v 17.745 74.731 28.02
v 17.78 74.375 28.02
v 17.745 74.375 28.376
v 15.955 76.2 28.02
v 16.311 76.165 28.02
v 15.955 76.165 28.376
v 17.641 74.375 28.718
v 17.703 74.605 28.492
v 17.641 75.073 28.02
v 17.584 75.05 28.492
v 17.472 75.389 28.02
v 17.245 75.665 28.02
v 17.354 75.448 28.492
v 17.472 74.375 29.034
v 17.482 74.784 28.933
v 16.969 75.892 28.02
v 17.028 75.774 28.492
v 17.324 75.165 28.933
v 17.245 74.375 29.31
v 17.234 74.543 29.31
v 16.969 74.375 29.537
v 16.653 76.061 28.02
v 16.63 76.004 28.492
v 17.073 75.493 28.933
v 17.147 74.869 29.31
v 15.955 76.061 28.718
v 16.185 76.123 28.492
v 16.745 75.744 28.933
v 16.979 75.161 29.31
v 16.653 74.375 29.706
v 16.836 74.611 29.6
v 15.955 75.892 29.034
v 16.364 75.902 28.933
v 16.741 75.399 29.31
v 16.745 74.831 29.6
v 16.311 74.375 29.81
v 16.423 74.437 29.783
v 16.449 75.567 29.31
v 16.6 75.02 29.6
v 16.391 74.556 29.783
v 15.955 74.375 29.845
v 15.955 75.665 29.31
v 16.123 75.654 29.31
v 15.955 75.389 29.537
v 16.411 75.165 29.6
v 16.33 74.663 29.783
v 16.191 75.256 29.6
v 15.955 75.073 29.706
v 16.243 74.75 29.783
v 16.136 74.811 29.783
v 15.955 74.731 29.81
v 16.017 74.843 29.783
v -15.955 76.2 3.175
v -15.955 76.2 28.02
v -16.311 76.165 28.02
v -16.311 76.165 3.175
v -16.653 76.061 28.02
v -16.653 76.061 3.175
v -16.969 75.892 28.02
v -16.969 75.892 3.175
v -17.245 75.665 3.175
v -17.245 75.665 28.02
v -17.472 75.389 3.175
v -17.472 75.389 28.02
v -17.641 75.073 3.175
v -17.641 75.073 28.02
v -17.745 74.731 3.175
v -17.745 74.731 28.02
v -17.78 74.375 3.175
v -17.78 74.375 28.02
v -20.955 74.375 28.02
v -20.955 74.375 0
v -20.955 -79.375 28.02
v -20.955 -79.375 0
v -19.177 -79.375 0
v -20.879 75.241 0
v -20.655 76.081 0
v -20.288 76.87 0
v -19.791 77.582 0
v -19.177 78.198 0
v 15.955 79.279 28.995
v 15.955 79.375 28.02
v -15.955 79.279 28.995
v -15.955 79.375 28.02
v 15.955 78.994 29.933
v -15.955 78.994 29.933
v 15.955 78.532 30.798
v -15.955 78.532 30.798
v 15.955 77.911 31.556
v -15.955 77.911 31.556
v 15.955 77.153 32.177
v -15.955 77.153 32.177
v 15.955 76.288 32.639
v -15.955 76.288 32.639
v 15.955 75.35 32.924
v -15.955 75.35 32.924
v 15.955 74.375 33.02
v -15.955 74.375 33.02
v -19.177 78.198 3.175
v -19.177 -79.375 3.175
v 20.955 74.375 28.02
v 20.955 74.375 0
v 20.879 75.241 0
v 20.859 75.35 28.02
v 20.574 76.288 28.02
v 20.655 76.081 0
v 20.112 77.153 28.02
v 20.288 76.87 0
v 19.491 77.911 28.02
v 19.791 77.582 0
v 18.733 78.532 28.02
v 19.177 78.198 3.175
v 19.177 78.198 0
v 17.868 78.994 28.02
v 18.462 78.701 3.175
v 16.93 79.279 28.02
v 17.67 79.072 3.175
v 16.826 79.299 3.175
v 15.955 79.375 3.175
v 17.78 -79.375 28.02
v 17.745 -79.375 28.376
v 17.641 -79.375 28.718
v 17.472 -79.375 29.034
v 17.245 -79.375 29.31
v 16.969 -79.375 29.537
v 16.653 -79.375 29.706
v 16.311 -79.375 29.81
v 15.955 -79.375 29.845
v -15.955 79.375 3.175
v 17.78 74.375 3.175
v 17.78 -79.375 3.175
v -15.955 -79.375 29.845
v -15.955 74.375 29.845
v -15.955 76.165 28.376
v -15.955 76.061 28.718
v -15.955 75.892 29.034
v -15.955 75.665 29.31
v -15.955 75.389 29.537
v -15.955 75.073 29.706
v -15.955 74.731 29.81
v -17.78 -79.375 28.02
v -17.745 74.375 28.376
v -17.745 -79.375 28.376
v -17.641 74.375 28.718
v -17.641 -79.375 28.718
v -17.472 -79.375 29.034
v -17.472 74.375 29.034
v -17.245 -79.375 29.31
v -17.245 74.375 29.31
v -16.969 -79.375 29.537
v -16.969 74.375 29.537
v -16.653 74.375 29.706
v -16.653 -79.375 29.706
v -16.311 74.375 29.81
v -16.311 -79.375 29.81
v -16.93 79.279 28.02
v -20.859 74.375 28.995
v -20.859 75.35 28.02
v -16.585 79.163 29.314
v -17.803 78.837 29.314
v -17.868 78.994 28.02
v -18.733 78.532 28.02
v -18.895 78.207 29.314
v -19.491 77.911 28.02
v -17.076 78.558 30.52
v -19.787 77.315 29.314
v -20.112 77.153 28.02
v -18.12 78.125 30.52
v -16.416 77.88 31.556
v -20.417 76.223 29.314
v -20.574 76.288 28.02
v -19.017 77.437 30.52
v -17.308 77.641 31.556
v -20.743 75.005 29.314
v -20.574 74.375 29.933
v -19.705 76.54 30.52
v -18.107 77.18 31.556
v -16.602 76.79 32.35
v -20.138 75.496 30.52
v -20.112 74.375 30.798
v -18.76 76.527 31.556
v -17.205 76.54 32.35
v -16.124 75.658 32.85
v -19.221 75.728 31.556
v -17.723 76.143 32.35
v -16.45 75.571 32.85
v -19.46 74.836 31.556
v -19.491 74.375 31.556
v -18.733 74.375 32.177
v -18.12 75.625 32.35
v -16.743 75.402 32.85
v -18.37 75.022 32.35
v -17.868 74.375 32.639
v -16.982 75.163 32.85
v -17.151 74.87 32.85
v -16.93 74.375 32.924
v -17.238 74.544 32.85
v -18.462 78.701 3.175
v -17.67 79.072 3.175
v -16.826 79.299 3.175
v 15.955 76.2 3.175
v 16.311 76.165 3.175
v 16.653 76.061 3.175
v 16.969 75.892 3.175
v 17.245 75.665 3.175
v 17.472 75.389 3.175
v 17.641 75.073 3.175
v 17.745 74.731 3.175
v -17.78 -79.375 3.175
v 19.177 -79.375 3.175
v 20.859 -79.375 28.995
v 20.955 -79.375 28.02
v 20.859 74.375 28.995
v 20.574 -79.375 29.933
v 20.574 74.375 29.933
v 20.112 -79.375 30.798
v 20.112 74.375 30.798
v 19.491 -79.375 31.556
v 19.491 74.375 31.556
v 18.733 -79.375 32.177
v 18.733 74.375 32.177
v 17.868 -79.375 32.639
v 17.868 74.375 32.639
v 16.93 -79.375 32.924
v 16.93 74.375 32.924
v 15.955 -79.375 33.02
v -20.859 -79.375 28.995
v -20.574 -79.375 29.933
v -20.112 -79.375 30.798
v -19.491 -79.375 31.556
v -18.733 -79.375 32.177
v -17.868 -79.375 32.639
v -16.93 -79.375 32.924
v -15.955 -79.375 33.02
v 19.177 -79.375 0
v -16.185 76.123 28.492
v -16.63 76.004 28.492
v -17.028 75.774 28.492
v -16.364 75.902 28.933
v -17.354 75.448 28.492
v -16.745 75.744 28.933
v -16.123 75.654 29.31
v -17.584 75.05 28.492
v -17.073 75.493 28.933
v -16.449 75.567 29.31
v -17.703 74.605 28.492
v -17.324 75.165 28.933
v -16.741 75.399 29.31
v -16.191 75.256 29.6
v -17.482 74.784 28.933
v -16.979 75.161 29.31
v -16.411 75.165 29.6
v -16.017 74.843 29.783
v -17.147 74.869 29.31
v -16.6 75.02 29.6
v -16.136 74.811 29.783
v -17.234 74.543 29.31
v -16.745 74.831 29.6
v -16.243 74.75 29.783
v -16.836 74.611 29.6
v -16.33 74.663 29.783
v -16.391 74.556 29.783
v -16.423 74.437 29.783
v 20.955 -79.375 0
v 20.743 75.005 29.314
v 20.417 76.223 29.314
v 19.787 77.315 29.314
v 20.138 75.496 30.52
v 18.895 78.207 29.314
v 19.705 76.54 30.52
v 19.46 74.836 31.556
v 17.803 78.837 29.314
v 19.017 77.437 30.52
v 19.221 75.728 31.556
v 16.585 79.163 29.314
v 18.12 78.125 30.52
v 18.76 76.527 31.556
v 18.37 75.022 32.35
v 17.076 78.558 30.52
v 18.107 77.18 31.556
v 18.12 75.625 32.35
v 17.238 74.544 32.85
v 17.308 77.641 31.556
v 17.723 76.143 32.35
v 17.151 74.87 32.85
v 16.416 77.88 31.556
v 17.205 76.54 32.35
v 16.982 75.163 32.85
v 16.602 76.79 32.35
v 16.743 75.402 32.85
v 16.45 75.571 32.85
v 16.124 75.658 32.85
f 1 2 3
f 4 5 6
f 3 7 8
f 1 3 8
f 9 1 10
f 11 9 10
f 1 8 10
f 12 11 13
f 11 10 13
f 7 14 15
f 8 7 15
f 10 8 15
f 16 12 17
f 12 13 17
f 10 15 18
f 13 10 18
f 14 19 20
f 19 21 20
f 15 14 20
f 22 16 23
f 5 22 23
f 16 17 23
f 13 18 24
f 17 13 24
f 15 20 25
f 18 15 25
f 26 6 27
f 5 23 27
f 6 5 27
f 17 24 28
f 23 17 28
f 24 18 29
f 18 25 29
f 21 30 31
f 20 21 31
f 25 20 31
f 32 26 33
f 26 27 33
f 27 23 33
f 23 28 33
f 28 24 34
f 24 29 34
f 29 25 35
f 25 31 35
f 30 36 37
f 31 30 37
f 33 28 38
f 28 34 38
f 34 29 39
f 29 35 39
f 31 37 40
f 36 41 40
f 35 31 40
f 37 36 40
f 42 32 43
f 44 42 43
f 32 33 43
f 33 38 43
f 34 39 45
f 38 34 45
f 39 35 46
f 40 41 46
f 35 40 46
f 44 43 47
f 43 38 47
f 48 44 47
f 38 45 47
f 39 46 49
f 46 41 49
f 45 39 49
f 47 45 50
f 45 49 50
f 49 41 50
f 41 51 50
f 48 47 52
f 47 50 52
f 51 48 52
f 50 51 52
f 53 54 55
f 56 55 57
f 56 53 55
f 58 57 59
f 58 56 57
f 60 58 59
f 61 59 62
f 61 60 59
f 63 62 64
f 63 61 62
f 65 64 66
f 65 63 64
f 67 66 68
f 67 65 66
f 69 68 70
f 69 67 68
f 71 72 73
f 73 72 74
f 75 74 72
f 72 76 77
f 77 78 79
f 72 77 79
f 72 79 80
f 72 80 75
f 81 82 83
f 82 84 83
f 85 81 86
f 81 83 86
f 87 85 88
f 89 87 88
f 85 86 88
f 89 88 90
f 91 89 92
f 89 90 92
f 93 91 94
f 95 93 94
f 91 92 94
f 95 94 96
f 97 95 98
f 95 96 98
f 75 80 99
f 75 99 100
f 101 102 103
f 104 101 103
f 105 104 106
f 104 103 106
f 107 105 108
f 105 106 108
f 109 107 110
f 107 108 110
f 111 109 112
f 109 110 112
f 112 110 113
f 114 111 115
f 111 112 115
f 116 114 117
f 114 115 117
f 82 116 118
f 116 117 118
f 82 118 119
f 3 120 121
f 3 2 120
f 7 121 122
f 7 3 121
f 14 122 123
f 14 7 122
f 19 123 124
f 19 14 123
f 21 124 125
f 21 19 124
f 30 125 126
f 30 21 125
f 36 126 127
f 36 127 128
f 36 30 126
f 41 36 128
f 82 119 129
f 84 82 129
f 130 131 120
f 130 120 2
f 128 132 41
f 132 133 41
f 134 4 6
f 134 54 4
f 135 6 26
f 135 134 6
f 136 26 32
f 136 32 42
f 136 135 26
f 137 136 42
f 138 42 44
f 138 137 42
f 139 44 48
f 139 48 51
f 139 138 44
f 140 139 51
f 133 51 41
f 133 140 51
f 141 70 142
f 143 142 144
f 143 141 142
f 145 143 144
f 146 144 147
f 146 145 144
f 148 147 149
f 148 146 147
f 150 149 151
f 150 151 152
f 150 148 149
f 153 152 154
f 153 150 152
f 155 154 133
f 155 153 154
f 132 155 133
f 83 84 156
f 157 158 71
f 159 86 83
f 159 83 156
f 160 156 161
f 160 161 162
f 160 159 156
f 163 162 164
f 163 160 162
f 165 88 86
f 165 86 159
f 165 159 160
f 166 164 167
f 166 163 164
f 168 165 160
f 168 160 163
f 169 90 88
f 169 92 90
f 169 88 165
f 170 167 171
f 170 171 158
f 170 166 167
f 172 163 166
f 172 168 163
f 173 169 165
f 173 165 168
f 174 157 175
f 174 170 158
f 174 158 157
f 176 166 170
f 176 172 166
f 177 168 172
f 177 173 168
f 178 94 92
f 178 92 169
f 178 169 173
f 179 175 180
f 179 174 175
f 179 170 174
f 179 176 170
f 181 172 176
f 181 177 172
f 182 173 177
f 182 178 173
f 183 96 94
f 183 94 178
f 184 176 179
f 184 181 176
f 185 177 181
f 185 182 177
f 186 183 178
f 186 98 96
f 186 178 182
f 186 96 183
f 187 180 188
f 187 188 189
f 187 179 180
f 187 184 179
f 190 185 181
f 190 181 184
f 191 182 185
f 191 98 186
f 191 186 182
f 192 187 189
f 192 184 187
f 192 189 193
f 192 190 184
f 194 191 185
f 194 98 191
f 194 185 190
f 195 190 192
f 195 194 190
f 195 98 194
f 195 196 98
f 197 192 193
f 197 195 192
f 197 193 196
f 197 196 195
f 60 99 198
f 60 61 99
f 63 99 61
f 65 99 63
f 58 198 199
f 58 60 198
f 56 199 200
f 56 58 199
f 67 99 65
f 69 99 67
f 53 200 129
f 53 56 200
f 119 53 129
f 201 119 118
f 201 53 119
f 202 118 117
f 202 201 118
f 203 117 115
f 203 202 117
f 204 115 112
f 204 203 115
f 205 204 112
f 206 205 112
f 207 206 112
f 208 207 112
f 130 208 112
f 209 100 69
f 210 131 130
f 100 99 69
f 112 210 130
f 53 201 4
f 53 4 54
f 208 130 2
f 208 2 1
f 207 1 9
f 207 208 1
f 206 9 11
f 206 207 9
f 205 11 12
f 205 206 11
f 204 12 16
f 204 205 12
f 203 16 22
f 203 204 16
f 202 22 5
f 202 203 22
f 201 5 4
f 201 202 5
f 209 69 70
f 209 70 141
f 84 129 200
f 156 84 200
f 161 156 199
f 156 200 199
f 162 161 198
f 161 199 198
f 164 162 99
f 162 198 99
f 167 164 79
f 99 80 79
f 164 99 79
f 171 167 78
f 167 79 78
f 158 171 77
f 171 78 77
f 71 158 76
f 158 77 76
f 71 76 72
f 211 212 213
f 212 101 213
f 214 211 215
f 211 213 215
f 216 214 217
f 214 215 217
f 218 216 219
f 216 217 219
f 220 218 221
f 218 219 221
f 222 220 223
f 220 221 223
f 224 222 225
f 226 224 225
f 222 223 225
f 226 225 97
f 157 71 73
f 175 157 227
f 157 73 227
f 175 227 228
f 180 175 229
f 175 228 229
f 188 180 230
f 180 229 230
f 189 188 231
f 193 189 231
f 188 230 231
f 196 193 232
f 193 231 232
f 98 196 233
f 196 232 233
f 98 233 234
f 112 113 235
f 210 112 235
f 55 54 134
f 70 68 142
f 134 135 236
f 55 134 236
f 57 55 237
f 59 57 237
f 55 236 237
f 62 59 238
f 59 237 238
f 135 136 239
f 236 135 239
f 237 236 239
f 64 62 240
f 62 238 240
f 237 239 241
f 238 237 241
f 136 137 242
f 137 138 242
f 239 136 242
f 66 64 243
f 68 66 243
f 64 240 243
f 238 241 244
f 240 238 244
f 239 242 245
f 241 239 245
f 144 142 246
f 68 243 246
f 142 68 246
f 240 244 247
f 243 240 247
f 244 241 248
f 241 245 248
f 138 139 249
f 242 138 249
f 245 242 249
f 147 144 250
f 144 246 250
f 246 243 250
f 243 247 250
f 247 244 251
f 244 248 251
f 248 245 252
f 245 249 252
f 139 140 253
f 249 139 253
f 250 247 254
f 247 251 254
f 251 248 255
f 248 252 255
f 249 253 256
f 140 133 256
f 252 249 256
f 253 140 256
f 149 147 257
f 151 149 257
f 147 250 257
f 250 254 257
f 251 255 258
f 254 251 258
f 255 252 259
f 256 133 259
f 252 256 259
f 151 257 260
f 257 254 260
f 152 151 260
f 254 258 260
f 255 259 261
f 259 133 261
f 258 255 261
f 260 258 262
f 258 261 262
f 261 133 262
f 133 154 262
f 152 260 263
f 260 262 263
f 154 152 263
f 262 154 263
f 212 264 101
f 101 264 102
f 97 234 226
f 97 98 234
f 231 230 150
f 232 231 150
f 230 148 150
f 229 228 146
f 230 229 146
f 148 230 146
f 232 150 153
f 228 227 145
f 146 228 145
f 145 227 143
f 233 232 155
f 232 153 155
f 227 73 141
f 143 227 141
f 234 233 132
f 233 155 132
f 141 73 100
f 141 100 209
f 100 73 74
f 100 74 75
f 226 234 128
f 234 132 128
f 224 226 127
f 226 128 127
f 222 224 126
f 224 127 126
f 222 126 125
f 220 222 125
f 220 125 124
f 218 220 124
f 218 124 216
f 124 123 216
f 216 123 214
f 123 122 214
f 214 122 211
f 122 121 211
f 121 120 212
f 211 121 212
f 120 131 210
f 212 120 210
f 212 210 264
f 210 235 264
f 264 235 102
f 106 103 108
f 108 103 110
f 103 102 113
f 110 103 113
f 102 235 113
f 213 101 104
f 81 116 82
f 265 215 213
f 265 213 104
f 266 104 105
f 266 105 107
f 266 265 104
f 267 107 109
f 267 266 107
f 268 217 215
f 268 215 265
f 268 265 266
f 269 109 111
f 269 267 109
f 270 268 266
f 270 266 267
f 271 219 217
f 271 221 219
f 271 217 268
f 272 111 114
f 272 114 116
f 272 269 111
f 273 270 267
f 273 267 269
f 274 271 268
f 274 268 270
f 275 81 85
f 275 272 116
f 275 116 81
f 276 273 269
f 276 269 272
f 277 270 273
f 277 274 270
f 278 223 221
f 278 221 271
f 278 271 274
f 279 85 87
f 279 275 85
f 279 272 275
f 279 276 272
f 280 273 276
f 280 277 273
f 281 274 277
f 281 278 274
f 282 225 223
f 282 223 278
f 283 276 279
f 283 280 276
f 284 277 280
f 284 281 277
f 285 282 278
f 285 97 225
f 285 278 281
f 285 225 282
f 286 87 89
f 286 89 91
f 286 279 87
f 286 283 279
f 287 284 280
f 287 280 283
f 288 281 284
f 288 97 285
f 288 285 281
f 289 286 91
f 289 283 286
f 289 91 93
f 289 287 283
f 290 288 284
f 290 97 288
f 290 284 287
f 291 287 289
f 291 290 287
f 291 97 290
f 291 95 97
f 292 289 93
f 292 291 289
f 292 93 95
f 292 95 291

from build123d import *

# Parameters (mm, degrees)
F1_DEPTH = 33.02
F2_R     = 5
F3_T     = -3.175
F4_W     = 38.354
F4_H     = 201.6773819923
F5_DEPTH = 3.175


with BuildPart() as f1:
    # F0 (on Top) → F1 (new body)
    with BuildSketch(Plane.XY):
        with BuildLine():
            ThreePointArc((20.955, 74.375), (19.4905339059, 77.9105339059), (15.955, 79.375))
            Line((15.955, 79.375), (-15.955, 79.375))
            ThreePointArc((-15.955, 79.375), (-19.4905339059, 77.9105339059), (-20.955, 74.375))
            Line((-20.955, 74.375), (-20.955, -79.375))
            Line((-20.955, -79.375), (20.955, -79.375))
            Line((20.955, -79.375), (20.955, 74.375))
        make_face()
    extrude(amount=F1_DEPTH)

    # F2
    f2_edges = [f1.edges().sort_by_distance(p)[0] for p in [
        (-20.955, -2.5, 33.02),
        (0, 79.375, 33.02),
    ]]
    fillet(f2_edges, radius=F2_R)

    # F3
    f3_openings = [f1.faces().sort_by_distance(p)[0] for p in [
        (0, -79.375, 16.389713),
        (0, -0.126416, 0),
    ]]
    offset(amount=F3_T, openings=f3_openings)

    # F4 (on face) → F5 (cut)
    with BuildSketch(Plane(origin=(0, 0, 0), x_dir=(1, 0, 0), z_dir=(0, 0, -1))):
        Rectangle(F4_W, F4_H)
    extrude(amount=-F5_DEPTH, mode=Mode.SUBTRACT)


solid = f1.part
